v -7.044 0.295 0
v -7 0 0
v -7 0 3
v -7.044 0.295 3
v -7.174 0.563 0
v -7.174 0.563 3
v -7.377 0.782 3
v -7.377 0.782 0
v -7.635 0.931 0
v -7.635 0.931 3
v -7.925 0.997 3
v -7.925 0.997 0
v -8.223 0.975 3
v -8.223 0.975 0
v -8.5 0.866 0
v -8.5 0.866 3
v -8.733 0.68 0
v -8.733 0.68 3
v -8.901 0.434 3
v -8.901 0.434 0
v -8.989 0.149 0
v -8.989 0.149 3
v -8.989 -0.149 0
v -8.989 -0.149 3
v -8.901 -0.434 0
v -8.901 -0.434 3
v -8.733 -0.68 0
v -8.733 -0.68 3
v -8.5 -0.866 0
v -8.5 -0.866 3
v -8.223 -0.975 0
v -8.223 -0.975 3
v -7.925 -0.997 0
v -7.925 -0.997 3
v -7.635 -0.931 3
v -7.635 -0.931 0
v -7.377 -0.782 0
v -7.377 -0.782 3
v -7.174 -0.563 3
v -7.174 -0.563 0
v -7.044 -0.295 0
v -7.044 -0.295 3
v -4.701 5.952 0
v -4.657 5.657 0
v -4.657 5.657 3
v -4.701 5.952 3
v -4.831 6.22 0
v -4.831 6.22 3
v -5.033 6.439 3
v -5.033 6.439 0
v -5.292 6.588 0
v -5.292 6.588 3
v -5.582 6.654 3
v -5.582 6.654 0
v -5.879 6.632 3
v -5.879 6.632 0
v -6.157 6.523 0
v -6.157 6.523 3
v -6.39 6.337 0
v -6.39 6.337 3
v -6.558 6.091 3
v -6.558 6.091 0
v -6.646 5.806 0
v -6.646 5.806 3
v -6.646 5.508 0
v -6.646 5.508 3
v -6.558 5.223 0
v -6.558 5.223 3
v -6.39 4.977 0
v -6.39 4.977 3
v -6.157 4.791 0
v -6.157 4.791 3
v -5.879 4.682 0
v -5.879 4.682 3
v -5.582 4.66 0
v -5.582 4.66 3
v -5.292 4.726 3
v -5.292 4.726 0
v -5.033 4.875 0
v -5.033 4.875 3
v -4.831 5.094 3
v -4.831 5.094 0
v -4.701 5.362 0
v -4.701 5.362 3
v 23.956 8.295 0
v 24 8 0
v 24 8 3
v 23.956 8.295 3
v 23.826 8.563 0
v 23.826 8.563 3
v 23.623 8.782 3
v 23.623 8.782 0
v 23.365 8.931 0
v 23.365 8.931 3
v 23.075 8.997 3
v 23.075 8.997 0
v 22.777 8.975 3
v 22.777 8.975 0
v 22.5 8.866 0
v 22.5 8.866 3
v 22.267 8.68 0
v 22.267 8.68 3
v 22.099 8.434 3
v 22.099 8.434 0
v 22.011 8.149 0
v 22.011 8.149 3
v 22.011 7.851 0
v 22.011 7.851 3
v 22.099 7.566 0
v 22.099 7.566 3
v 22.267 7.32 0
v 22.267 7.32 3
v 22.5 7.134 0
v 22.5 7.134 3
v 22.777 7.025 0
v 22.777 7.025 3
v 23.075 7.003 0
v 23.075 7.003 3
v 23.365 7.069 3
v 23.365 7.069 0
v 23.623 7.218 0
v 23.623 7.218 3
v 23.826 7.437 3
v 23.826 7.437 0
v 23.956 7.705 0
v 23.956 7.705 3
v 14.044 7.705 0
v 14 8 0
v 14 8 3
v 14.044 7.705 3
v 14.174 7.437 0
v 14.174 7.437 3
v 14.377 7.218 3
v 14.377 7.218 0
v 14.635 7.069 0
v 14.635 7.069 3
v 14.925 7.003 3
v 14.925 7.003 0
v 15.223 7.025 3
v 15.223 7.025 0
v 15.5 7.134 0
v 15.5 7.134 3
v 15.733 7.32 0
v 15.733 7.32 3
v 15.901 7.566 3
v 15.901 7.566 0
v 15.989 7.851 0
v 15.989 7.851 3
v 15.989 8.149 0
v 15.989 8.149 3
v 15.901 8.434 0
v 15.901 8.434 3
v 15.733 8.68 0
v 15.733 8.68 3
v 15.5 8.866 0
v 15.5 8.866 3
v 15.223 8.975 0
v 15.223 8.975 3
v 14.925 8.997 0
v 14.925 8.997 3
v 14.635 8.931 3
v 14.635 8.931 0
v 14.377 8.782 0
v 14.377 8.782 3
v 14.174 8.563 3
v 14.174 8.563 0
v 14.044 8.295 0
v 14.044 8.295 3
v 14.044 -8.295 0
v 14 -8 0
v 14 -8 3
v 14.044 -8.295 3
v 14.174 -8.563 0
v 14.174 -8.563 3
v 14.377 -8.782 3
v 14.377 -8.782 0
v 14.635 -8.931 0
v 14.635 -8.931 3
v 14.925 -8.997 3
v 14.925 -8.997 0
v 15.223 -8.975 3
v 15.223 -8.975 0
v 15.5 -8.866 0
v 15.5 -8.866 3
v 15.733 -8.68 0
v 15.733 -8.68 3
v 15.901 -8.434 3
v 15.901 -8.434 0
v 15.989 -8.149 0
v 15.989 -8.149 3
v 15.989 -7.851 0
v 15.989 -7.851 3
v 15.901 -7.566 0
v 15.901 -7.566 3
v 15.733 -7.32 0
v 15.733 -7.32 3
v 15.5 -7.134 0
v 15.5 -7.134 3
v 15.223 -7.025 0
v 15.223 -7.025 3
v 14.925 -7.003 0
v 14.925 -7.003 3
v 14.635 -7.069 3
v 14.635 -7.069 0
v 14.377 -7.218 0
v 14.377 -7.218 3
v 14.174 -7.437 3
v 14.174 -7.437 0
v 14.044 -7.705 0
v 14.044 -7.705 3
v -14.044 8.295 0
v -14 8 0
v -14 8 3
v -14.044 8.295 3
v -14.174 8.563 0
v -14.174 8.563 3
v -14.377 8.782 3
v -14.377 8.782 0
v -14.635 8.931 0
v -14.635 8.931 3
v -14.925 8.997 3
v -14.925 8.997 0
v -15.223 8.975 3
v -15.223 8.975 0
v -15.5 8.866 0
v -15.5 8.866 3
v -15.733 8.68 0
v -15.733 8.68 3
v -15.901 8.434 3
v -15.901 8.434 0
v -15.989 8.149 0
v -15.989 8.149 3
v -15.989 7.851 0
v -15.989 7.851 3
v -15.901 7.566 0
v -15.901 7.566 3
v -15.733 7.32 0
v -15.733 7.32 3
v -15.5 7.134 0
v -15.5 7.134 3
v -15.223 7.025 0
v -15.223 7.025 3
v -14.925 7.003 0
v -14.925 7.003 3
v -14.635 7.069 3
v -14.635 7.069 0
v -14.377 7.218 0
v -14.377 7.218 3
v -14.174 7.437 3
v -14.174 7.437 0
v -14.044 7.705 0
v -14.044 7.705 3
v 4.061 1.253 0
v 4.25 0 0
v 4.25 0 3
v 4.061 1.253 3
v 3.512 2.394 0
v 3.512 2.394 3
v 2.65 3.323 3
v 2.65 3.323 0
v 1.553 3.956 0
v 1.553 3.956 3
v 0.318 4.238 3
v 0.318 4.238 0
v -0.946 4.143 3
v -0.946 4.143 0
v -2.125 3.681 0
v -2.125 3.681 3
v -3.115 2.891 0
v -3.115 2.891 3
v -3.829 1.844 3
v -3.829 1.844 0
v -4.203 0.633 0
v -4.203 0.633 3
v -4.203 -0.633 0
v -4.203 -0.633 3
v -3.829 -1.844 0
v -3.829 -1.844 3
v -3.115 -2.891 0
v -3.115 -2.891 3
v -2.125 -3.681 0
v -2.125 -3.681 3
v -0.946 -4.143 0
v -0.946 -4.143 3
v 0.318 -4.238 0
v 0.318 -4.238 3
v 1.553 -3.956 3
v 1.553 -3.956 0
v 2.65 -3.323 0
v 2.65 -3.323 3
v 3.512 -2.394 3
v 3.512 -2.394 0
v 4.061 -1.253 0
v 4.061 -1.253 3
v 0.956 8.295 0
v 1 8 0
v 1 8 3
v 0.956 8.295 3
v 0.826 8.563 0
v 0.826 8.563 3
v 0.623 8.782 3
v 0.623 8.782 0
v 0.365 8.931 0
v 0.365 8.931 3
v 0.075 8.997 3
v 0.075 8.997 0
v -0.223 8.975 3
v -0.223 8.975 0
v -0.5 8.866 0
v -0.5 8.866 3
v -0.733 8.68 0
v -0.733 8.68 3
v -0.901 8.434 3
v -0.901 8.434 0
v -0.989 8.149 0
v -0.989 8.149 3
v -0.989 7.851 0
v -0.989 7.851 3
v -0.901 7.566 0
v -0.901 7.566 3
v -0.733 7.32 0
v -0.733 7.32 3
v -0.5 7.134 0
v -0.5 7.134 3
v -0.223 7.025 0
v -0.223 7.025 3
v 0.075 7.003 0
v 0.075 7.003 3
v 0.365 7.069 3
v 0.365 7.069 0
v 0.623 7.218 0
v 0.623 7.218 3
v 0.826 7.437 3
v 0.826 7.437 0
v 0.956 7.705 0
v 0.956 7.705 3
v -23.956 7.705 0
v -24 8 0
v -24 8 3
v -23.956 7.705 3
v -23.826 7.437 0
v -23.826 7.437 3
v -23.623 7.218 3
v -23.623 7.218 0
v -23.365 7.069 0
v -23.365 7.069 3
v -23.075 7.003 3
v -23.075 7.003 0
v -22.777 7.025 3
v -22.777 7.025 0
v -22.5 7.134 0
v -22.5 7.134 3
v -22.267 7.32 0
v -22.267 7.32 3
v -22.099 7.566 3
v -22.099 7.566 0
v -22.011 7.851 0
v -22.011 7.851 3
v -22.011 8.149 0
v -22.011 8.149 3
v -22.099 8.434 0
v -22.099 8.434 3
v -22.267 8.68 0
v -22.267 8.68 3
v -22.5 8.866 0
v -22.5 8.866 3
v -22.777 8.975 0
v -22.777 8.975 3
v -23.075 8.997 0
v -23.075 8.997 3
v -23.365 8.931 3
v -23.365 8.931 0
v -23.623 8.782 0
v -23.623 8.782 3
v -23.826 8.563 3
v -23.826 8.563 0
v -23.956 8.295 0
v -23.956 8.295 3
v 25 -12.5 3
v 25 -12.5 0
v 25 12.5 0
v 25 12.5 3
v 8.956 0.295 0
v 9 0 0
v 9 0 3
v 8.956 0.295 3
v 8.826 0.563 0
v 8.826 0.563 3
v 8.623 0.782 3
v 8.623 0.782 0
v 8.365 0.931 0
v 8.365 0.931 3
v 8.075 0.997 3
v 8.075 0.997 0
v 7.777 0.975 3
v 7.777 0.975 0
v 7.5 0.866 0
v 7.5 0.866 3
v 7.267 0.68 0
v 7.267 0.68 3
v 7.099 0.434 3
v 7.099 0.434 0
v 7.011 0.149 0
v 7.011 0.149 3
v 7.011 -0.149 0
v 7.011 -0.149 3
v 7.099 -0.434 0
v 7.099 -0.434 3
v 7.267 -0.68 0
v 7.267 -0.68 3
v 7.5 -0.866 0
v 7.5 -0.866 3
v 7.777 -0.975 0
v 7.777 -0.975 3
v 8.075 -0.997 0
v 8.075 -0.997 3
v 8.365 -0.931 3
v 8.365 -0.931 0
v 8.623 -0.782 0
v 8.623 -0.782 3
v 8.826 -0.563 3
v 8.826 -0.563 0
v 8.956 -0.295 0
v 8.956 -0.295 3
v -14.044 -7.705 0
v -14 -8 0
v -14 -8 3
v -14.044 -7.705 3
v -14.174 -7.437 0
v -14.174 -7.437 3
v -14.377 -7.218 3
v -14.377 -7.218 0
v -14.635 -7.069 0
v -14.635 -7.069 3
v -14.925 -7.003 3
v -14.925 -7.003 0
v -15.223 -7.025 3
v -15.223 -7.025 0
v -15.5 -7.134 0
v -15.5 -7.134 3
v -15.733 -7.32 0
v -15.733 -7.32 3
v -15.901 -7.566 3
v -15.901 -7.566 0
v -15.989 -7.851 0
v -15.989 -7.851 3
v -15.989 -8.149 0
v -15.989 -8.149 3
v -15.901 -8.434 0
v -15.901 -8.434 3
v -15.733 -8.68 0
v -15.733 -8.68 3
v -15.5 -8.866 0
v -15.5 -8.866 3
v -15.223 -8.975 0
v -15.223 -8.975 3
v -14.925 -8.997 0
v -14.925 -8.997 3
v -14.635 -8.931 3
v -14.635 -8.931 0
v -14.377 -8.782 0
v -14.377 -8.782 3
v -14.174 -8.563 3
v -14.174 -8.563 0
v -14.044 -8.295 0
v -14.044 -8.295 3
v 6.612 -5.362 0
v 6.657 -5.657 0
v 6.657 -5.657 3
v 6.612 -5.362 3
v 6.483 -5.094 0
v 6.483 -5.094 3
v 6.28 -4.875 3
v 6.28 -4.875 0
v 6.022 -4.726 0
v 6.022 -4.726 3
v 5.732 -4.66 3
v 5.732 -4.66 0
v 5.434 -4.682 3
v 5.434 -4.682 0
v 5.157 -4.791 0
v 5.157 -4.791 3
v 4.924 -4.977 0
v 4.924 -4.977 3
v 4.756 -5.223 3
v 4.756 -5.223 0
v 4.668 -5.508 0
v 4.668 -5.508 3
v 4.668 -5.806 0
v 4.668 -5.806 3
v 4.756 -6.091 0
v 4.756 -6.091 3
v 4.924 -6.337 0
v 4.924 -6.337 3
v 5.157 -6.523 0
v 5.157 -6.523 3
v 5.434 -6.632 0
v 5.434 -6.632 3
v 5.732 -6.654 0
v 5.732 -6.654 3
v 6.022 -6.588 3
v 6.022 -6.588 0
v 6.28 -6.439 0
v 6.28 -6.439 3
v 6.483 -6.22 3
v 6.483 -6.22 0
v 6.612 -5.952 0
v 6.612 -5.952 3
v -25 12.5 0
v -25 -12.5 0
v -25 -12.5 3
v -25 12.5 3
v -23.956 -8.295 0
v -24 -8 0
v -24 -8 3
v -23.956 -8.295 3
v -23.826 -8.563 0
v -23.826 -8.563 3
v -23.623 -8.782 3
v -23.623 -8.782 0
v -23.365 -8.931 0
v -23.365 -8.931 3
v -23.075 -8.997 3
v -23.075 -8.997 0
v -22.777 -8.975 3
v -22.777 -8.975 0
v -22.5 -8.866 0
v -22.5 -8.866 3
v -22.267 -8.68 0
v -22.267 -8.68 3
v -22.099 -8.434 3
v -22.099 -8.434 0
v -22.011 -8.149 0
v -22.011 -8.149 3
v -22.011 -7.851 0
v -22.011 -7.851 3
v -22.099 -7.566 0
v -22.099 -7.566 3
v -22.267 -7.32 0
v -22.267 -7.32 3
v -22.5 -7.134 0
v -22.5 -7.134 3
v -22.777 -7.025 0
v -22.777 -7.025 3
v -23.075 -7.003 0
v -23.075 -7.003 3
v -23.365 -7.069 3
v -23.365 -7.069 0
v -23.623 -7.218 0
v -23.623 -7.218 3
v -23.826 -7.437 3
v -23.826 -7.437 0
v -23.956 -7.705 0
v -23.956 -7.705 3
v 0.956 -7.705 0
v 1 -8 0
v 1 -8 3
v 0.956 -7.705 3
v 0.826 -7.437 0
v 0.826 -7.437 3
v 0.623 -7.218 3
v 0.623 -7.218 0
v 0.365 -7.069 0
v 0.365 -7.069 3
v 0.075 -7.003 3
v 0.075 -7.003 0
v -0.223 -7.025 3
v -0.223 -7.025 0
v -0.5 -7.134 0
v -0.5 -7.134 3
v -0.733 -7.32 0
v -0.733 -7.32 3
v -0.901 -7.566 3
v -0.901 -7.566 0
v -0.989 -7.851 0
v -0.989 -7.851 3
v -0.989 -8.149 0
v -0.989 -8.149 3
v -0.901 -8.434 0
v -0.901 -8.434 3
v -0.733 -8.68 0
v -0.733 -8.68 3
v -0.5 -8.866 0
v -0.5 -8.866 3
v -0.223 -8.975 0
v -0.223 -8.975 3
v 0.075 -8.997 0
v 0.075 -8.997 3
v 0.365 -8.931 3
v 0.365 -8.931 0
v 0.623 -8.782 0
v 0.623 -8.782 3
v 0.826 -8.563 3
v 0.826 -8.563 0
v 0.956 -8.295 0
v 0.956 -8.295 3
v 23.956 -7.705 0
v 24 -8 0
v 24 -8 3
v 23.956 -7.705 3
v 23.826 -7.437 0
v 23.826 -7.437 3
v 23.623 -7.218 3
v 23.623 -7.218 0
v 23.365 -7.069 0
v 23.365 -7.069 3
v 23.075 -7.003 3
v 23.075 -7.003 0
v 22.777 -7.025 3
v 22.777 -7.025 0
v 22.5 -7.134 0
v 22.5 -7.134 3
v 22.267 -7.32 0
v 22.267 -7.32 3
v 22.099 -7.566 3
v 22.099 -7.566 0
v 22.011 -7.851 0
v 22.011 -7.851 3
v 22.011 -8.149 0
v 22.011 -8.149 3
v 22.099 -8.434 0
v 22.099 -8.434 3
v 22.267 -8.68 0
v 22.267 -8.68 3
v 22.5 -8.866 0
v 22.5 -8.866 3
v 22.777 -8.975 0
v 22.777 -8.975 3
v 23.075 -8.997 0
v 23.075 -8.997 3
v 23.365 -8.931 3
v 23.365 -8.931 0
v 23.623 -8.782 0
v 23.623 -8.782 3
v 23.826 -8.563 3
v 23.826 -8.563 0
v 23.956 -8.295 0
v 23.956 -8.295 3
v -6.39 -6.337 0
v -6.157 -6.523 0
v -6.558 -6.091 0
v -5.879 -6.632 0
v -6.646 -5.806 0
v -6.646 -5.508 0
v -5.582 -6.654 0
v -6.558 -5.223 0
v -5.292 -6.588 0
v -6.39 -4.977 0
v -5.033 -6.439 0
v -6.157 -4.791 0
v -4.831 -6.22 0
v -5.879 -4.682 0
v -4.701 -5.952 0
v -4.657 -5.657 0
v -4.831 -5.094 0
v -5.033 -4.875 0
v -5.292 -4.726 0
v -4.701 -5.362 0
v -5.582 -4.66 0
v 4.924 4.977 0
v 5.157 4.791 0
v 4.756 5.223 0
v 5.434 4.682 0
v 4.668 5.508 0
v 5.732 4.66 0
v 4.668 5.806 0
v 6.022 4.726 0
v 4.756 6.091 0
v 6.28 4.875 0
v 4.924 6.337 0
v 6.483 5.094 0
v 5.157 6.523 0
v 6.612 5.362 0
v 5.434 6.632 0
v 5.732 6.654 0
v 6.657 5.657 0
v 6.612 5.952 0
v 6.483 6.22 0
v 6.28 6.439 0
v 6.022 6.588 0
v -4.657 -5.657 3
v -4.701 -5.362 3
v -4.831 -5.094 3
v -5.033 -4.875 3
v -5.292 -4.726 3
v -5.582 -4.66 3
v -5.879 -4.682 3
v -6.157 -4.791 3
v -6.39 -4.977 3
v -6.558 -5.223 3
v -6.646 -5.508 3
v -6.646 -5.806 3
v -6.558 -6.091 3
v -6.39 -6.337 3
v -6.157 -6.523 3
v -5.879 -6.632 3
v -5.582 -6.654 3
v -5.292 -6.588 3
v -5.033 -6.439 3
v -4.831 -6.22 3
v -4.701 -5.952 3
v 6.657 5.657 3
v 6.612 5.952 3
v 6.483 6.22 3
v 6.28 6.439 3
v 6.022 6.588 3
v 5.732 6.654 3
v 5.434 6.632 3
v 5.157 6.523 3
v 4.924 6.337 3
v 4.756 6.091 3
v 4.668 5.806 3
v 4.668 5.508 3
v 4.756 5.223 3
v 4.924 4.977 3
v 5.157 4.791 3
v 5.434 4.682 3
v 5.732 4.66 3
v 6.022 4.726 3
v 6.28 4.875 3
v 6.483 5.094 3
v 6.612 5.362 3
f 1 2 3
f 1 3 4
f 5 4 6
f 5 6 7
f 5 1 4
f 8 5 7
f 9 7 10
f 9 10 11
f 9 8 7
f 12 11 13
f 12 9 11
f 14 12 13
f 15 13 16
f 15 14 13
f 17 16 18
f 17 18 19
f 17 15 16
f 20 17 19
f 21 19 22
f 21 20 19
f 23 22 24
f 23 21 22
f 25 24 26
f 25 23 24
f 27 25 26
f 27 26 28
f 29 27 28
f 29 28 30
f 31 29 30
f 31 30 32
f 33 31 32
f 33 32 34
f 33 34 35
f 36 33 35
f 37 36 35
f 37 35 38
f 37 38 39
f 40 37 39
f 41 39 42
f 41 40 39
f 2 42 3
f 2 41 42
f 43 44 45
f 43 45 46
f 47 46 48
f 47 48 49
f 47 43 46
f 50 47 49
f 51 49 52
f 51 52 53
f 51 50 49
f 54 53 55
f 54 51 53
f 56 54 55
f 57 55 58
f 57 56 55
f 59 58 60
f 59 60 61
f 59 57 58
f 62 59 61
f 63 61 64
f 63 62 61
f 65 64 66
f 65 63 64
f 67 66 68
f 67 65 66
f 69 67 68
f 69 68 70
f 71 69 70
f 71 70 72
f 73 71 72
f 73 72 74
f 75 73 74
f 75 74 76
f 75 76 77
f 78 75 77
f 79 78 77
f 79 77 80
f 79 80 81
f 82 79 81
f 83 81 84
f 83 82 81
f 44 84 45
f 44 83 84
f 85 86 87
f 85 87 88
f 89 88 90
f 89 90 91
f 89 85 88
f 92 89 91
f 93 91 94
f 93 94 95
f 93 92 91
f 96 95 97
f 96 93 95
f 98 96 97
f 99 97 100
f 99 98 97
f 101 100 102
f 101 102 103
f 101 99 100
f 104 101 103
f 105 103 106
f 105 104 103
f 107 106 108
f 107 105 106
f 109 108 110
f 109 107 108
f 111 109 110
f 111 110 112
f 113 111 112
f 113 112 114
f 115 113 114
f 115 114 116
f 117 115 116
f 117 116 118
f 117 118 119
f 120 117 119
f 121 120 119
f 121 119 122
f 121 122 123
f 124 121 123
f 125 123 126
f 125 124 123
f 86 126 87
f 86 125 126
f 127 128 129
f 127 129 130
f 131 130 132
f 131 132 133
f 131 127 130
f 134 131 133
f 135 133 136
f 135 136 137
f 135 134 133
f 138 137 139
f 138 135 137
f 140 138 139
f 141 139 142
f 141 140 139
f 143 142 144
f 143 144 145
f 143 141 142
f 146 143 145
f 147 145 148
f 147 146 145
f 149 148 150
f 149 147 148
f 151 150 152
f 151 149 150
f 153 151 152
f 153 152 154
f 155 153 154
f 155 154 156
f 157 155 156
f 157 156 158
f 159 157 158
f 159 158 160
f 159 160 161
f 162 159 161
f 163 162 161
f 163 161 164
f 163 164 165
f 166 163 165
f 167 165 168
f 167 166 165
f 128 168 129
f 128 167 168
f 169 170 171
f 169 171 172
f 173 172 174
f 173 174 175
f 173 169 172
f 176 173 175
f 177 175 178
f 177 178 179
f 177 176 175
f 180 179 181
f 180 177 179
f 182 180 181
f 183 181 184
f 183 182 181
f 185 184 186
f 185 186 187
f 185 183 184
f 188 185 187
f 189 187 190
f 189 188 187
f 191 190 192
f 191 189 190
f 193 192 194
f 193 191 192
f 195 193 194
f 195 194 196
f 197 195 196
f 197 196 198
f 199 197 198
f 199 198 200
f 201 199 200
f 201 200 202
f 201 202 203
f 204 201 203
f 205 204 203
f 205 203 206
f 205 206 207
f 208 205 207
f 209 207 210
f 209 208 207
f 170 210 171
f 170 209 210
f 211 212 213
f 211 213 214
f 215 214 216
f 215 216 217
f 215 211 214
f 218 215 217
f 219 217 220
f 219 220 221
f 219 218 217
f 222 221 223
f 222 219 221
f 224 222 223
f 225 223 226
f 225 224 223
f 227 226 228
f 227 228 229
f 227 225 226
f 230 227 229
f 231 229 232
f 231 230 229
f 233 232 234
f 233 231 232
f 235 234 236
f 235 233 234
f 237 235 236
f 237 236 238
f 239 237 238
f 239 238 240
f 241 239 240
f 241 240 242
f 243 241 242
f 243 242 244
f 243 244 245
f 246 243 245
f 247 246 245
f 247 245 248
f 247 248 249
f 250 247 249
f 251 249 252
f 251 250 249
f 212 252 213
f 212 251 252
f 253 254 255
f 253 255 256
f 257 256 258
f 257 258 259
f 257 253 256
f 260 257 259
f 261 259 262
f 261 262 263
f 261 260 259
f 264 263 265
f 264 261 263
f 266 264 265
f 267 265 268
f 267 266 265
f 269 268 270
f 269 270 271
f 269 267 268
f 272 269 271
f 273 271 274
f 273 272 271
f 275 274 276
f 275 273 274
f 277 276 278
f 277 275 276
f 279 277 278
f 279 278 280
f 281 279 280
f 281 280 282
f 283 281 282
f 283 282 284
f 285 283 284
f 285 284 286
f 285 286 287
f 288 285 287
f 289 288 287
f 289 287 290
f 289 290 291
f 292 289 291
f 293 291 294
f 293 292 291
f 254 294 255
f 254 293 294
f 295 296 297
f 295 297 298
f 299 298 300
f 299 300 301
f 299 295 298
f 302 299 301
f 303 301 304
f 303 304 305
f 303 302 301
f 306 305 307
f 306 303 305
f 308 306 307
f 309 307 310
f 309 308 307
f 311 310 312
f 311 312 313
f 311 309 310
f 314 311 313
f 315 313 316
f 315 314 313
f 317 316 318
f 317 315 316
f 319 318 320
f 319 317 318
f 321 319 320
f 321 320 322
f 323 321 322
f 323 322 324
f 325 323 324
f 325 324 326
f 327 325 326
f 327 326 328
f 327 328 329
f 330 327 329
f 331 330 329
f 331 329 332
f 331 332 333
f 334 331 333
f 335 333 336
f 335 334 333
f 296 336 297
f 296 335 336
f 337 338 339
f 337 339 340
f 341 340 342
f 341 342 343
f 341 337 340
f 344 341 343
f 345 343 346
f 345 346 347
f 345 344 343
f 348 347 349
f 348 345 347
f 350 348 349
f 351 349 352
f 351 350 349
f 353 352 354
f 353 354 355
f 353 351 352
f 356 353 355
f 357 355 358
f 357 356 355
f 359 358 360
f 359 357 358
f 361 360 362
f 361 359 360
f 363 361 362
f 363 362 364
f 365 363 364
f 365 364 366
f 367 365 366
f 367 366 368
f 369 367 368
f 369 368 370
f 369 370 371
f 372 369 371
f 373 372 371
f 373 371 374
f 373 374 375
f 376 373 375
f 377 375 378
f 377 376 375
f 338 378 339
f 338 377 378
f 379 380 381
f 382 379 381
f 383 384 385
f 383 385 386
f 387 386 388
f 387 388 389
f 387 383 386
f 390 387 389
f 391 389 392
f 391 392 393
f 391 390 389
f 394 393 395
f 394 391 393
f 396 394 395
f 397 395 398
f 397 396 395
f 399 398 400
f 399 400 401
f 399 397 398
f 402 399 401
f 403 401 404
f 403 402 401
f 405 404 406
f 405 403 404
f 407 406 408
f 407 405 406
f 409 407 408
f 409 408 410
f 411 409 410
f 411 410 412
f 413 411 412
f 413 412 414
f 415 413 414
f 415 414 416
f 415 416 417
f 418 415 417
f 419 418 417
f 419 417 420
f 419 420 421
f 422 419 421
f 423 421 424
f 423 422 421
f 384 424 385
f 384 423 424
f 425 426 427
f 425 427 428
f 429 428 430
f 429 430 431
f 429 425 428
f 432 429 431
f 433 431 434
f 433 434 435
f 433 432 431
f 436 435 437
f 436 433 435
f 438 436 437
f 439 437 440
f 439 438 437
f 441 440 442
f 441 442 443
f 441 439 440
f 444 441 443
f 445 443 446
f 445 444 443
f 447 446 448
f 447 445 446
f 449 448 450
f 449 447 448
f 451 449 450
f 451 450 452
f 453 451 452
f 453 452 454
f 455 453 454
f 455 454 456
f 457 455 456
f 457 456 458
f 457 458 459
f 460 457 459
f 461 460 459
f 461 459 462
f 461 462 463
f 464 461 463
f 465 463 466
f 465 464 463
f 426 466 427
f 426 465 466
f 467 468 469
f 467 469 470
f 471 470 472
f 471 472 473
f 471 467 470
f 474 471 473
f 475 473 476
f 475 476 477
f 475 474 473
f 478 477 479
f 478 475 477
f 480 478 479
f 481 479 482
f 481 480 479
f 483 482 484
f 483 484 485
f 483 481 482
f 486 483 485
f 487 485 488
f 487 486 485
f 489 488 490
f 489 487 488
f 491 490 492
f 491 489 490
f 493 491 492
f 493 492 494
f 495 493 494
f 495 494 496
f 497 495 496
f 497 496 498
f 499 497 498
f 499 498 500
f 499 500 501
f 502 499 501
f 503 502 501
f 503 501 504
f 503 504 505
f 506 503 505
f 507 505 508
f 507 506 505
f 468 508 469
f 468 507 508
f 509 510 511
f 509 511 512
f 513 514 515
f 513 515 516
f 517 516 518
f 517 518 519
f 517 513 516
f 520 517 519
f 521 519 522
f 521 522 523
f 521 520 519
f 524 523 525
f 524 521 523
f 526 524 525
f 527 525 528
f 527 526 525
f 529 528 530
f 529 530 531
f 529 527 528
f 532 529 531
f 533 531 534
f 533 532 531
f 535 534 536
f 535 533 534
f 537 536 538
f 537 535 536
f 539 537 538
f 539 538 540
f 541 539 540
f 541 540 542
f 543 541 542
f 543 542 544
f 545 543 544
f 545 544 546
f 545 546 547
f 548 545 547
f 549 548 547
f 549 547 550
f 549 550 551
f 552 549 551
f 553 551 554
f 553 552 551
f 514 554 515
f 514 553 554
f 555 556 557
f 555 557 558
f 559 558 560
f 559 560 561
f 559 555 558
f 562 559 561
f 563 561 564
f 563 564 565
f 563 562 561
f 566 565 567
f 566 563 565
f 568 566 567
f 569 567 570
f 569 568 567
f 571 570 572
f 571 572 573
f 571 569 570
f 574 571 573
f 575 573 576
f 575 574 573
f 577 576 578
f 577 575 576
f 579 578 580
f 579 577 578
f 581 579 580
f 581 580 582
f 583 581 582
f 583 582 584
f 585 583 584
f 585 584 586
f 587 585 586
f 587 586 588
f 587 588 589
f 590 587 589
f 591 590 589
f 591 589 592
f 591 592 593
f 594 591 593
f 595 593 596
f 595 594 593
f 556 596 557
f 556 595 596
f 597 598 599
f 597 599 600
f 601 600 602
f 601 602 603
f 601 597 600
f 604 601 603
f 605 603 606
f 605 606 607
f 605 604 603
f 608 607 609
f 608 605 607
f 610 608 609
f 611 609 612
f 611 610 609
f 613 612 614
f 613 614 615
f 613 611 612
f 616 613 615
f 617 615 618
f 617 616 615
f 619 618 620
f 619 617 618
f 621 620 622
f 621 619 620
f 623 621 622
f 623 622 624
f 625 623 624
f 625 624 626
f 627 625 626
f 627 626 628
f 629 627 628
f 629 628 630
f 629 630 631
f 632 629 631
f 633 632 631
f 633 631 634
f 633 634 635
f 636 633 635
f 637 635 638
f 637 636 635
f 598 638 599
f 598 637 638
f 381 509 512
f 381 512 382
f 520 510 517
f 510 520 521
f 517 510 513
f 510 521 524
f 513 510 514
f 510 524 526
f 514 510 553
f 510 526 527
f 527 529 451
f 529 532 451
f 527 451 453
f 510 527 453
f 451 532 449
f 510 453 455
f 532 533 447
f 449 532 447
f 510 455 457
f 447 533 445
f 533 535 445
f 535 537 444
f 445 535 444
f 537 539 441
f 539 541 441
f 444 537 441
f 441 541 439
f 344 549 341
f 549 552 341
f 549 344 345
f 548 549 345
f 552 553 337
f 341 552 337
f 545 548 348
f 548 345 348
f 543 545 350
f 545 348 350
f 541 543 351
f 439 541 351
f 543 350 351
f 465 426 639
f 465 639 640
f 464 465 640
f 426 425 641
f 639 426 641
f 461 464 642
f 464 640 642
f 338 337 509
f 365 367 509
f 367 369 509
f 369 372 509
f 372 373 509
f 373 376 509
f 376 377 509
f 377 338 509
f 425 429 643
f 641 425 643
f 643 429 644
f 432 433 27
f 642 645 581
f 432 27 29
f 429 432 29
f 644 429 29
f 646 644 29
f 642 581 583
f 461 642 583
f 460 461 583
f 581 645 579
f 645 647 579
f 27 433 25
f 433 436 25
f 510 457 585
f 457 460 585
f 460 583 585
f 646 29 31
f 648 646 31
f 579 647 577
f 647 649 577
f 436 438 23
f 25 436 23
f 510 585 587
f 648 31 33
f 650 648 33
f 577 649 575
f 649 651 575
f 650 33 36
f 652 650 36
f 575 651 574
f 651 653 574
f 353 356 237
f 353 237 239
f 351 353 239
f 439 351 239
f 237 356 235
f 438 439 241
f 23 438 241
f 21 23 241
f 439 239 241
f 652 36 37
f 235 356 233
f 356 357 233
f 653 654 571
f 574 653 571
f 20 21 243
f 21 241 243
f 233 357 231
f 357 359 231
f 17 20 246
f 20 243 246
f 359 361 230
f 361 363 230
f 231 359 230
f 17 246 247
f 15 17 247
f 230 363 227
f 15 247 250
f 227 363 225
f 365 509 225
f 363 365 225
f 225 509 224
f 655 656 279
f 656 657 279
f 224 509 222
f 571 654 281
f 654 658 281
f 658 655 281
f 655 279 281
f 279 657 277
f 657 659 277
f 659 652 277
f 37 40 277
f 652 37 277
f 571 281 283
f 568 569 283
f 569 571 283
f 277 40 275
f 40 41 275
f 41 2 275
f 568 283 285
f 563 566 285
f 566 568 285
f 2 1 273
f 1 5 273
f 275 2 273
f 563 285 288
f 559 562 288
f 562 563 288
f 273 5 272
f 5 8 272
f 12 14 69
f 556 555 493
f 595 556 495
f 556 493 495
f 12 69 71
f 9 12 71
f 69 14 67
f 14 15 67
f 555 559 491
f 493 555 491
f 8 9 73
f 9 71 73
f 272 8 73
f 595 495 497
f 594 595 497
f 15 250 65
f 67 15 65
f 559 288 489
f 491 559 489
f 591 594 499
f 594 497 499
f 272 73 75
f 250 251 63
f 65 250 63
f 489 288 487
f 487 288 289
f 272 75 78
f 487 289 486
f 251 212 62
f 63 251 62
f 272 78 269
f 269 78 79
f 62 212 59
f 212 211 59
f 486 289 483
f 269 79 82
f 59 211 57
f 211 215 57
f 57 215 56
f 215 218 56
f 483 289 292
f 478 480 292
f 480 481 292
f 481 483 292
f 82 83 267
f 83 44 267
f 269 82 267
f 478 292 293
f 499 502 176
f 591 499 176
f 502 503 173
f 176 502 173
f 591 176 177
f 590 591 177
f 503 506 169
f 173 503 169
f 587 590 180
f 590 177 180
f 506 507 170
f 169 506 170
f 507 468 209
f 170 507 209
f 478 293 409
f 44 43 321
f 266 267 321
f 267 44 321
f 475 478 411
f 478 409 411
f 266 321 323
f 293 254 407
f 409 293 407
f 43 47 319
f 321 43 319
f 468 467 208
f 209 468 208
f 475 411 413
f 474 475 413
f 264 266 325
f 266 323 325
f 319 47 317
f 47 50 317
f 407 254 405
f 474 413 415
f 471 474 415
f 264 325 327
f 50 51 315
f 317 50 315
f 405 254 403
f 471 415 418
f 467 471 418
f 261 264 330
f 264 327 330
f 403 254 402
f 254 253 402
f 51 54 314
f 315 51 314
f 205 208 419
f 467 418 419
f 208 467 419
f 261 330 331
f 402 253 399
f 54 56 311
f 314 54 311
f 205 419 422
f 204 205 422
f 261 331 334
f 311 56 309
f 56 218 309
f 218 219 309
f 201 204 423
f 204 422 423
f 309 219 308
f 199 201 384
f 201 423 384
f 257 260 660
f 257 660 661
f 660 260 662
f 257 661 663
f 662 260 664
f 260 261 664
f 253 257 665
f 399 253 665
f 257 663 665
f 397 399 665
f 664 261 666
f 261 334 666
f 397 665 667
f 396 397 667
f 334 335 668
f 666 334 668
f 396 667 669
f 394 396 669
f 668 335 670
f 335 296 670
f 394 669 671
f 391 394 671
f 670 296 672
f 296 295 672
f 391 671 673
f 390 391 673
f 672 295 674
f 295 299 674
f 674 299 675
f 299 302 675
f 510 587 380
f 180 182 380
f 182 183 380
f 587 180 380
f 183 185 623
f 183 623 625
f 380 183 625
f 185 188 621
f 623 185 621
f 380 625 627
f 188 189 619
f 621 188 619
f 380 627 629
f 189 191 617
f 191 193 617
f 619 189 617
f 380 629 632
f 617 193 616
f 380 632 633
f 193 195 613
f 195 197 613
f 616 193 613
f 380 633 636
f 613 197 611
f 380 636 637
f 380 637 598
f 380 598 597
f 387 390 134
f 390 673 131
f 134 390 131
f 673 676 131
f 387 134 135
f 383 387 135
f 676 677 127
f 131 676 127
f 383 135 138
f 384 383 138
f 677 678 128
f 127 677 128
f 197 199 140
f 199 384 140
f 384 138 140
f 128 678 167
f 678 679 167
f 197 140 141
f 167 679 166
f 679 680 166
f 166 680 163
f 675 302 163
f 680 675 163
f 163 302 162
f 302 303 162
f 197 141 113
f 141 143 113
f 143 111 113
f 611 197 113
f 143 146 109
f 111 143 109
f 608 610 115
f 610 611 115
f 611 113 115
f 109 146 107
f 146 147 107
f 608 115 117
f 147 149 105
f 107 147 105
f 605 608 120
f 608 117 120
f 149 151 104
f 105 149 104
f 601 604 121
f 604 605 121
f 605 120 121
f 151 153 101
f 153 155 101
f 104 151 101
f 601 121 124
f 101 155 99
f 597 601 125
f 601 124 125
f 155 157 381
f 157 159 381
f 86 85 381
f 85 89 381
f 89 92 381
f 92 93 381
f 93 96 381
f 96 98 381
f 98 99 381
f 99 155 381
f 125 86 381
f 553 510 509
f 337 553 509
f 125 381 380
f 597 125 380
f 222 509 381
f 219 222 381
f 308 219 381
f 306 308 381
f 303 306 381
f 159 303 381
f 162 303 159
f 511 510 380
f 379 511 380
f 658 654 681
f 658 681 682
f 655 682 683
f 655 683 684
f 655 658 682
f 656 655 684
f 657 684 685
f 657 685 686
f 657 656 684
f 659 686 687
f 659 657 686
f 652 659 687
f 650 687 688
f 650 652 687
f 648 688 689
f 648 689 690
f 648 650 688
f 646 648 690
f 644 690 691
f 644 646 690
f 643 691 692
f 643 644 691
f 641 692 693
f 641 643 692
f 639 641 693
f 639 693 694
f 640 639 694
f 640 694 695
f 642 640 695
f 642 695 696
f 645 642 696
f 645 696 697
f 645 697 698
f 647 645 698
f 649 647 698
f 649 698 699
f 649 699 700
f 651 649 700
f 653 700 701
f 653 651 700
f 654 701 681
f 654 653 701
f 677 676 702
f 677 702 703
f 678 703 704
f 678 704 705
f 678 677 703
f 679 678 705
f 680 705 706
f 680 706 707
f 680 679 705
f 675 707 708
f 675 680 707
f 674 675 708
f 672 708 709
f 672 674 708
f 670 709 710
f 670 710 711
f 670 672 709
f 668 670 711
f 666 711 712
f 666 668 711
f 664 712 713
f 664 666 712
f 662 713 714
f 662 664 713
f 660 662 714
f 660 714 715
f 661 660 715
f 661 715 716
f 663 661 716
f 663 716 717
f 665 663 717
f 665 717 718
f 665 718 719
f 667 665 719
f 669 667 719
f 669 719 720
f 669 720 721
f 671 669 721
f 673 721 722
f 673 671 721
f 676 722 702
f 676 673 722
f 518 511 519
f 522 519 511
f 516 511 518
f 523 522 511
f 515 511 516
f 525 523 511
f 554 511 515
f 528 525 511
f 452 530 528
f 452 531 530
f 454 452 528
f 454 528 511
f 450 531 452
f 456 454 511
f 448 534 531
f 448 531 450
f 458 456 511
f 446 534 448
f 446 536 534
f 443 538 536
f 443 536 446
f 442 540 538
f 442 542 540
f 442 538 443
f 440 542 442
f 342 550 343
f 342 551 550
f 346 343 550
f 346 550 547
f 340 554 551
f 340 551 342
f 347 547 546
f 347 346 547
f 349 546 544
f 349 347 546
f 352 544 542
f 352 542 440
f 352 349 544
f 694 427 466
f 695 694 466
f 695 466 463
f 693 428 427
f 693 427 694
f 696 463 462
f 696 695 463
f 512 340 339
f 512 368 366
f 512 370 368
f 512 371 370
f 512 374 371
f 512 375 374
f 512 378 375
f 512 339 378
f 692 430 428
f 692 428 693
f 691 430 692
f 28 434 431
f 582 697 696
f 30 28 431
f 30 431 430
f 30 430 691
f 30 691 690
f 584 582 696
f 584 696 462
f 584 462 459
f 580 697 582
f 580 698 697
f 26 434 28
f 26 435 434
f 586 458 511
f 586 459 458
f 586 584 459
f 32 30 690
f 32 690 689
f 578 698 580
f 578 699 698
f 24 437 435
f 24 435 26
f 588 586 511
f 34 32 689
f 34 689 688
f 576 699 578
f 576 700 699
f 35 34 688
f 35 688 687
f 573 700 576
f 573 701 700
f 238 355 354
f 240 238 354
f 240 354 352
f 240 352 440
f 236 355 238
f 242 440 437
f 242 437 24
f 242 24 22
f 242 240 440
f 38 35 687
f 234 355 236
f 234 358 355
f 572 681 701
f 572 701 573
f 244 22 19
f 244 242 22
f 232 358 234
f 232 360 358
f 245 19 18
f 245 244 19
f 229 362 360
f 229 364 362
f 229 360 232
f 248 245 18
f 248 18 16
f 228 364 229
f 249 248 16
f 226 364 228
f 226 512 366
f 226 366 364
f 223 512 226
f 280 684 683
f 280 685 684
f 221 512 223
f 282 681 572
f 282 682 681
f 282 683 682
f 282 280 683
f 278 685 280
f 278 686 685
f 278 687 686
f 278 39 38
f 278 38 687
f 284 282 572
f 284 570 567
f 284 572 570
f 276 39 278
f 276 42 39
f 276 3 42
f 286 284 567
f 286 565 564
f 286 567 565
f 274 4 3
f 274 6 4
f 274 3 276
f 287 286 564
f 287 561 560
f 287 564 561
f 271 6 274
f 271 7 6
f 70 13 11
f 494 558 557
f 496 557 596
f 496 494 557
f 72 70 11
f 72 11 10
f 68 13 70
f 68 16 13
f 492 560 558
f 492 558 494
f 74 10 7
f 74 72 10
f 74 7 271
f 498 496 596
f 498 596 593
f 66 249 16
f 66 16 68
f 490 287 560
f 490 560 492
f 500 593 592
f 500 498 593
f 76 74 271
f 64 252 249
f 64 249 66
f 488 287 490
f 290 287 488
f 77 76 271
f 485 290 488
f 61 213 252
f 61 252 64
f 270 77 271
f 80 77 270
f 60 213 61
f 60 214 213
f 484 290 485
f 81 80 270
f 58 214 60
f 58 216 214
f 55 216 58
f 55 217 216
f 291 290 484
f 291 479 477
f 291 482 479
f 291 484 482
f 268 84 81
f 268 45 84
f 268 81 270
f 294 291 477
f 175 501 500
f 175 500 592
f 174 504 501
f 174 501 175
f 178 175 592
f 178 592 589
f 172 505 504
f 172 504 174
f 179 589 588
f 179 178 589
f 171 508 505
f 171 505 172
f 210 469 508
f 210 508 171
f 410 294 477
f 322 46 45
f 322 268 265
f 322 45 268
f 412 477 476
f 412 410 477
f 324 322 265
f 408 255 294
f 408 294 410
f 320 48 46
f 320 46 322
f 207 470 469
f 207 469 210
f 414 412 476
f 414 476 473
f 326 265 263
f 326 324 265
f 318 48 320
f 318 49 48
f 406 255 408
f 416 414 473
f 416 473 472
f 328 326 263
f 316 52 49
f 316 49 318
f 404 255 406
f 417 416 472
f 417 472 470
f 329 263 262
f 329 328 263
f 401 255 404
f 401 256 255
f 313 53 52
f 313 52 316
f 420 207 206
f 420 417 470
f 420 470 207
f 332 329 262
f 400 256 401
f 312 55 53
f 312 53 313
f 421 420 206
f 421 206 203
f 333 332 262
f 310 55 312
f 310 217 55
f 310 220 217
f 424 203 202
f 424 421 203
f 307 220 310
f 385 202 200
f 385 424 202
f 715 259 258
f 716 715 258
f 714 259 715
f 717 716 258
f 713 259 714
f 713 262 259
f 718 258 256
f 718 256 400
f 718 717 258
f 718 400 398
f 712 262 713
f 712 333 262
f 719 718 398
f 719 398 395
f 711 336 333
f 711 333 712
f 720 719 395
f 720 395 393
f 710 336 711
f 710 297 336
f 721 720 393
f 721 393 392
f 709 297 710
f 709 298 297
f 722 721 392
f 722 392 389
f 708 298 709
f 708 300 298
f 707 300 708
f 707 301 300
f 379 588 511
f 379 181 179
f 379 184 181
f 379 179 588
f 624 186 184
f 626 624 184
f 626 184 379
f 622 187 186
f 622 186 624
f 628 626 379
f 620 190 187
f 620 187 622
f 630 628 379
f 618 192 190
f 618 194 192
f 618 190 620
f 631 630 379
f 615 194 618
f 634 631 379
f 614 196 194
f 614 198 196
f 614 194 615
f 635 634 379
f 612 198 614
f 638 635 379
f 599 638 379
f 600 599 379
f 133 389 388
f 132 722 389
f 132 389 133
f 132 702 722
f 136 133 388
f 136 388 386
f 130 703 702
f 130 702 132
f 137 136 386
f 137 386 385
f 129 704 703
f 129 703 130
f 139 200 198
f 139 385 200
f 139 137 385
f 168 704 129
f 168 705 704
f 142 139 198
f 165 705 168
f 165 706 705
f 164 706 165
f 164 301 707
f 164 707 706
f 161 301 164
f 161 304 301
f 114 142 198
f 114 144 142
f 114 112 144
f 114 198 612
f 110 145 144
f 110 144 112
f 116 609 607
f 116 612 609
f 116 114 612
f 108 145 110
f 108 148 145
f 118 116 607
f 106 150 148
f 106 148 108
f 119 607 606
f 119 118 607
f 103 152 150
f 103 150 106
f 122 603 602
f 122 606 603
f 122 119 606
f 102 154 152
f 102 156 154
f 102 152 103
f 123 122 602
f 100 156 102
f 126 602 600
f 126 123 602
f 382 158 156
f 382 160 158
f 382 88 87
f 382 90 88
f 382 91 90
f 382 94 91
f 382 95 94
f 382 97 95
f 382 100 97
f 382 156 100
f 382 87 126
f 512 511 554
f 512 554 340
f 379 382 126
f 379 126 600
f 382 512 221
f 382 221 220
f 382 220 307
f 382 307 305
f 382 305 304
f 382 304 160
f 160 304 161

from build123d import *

# Parameters (mm, degrees)
ESBO_O1_W                = 50
ESBO_O1_H                = 25
ESBO_O1_R                = 4.25
ESBO_O1_R_2              = 1
RESSALTO_EXTRUS_O1_DEPTH = 3


with BuildPart() as part:
    # Esboço1 → Ressalto-extrusão1 (new body)
    with BuildSketch(Plane.XY):
        Rectangle(ESBO_O1_W, ESBO_O1_H)
        Circle(ESBO_O1_R, mode=Mode.SUBTRACT)
        with Locations((0, 8)):
            Circle(ESBO_O1_R_2, mode=Mode.SUBTRACT)
        with Locations((5.656854249, 5.656854249)):
            Circle(ESBO_O1_R_2, mode=Mode.SUBTRACT)
        with Locations((8, 0)):
            Circle(ESBO_O1_R_2, mode=Mode.SUBTRACT)
        with Locations((5.656854249, -5.656854249)):
            Circle(ESBO_O1_R_2, mode=Mode.SUBTRACT)
        with Locations((0, -8)):
            Circle(ESBO_O1_R_2, mode=Mode.SUBTRACT)
        with Locations((-5.656854249, -5.656854249)):
            Circle(ESBO_O1_R_2, mode=Mode.SUBTRACT)
        with Locations((-8, 0)):
            Circle(ESBO_O1_R_2, mode=Mode.SUBTRACT)
        with Locations((-5.656854249, 5.656854249)):
            Circle(ESBO_O1_R_2, mode=Mode.SUBTRACT)
        with Locations((-15, 8)):
            Circle(ESBO_O1_R_2, mode=Mode.SUBTRACT)
        with Locations((-15, -8)):
            Circle(ESBO_O1_R_2, mode=Mode.SUBTRACT)
        with Locations(Location((15, -8, 0), (0, 0, 180))):
            Circle(ESBO_O1_R_2, mode=Mode.SUBTRACT)
        with Locations(Location((15, 8, 0), (0, 0, 180))):
            Circle(ESBO_O1_R_2, mode=Mode.SUBTRACT)
        with Locations((23, 8)):
            Circle(ESBO_O1_R_2, mode=Mode.SUBTRACT)
        with Locations((23, -8)):
            Circle(ESBO_O1_R_2, mode=Mode.SUBTRACT)
        with Locations(Location((-23, -8, 0), (0, 0, 180))):
            Circle(ESBO_O1_R_2, mode=Mode.SUBTRACT)
        with Locations(Location((-23, 8, 0), (0, 0, 180))):
            Circle(ESBO_O1_R_2, mode=Mode.SUBTRACT)
    extrude(amount=RESSALTO_EXTRUS_O1_DEPTH)


solid = part.part
